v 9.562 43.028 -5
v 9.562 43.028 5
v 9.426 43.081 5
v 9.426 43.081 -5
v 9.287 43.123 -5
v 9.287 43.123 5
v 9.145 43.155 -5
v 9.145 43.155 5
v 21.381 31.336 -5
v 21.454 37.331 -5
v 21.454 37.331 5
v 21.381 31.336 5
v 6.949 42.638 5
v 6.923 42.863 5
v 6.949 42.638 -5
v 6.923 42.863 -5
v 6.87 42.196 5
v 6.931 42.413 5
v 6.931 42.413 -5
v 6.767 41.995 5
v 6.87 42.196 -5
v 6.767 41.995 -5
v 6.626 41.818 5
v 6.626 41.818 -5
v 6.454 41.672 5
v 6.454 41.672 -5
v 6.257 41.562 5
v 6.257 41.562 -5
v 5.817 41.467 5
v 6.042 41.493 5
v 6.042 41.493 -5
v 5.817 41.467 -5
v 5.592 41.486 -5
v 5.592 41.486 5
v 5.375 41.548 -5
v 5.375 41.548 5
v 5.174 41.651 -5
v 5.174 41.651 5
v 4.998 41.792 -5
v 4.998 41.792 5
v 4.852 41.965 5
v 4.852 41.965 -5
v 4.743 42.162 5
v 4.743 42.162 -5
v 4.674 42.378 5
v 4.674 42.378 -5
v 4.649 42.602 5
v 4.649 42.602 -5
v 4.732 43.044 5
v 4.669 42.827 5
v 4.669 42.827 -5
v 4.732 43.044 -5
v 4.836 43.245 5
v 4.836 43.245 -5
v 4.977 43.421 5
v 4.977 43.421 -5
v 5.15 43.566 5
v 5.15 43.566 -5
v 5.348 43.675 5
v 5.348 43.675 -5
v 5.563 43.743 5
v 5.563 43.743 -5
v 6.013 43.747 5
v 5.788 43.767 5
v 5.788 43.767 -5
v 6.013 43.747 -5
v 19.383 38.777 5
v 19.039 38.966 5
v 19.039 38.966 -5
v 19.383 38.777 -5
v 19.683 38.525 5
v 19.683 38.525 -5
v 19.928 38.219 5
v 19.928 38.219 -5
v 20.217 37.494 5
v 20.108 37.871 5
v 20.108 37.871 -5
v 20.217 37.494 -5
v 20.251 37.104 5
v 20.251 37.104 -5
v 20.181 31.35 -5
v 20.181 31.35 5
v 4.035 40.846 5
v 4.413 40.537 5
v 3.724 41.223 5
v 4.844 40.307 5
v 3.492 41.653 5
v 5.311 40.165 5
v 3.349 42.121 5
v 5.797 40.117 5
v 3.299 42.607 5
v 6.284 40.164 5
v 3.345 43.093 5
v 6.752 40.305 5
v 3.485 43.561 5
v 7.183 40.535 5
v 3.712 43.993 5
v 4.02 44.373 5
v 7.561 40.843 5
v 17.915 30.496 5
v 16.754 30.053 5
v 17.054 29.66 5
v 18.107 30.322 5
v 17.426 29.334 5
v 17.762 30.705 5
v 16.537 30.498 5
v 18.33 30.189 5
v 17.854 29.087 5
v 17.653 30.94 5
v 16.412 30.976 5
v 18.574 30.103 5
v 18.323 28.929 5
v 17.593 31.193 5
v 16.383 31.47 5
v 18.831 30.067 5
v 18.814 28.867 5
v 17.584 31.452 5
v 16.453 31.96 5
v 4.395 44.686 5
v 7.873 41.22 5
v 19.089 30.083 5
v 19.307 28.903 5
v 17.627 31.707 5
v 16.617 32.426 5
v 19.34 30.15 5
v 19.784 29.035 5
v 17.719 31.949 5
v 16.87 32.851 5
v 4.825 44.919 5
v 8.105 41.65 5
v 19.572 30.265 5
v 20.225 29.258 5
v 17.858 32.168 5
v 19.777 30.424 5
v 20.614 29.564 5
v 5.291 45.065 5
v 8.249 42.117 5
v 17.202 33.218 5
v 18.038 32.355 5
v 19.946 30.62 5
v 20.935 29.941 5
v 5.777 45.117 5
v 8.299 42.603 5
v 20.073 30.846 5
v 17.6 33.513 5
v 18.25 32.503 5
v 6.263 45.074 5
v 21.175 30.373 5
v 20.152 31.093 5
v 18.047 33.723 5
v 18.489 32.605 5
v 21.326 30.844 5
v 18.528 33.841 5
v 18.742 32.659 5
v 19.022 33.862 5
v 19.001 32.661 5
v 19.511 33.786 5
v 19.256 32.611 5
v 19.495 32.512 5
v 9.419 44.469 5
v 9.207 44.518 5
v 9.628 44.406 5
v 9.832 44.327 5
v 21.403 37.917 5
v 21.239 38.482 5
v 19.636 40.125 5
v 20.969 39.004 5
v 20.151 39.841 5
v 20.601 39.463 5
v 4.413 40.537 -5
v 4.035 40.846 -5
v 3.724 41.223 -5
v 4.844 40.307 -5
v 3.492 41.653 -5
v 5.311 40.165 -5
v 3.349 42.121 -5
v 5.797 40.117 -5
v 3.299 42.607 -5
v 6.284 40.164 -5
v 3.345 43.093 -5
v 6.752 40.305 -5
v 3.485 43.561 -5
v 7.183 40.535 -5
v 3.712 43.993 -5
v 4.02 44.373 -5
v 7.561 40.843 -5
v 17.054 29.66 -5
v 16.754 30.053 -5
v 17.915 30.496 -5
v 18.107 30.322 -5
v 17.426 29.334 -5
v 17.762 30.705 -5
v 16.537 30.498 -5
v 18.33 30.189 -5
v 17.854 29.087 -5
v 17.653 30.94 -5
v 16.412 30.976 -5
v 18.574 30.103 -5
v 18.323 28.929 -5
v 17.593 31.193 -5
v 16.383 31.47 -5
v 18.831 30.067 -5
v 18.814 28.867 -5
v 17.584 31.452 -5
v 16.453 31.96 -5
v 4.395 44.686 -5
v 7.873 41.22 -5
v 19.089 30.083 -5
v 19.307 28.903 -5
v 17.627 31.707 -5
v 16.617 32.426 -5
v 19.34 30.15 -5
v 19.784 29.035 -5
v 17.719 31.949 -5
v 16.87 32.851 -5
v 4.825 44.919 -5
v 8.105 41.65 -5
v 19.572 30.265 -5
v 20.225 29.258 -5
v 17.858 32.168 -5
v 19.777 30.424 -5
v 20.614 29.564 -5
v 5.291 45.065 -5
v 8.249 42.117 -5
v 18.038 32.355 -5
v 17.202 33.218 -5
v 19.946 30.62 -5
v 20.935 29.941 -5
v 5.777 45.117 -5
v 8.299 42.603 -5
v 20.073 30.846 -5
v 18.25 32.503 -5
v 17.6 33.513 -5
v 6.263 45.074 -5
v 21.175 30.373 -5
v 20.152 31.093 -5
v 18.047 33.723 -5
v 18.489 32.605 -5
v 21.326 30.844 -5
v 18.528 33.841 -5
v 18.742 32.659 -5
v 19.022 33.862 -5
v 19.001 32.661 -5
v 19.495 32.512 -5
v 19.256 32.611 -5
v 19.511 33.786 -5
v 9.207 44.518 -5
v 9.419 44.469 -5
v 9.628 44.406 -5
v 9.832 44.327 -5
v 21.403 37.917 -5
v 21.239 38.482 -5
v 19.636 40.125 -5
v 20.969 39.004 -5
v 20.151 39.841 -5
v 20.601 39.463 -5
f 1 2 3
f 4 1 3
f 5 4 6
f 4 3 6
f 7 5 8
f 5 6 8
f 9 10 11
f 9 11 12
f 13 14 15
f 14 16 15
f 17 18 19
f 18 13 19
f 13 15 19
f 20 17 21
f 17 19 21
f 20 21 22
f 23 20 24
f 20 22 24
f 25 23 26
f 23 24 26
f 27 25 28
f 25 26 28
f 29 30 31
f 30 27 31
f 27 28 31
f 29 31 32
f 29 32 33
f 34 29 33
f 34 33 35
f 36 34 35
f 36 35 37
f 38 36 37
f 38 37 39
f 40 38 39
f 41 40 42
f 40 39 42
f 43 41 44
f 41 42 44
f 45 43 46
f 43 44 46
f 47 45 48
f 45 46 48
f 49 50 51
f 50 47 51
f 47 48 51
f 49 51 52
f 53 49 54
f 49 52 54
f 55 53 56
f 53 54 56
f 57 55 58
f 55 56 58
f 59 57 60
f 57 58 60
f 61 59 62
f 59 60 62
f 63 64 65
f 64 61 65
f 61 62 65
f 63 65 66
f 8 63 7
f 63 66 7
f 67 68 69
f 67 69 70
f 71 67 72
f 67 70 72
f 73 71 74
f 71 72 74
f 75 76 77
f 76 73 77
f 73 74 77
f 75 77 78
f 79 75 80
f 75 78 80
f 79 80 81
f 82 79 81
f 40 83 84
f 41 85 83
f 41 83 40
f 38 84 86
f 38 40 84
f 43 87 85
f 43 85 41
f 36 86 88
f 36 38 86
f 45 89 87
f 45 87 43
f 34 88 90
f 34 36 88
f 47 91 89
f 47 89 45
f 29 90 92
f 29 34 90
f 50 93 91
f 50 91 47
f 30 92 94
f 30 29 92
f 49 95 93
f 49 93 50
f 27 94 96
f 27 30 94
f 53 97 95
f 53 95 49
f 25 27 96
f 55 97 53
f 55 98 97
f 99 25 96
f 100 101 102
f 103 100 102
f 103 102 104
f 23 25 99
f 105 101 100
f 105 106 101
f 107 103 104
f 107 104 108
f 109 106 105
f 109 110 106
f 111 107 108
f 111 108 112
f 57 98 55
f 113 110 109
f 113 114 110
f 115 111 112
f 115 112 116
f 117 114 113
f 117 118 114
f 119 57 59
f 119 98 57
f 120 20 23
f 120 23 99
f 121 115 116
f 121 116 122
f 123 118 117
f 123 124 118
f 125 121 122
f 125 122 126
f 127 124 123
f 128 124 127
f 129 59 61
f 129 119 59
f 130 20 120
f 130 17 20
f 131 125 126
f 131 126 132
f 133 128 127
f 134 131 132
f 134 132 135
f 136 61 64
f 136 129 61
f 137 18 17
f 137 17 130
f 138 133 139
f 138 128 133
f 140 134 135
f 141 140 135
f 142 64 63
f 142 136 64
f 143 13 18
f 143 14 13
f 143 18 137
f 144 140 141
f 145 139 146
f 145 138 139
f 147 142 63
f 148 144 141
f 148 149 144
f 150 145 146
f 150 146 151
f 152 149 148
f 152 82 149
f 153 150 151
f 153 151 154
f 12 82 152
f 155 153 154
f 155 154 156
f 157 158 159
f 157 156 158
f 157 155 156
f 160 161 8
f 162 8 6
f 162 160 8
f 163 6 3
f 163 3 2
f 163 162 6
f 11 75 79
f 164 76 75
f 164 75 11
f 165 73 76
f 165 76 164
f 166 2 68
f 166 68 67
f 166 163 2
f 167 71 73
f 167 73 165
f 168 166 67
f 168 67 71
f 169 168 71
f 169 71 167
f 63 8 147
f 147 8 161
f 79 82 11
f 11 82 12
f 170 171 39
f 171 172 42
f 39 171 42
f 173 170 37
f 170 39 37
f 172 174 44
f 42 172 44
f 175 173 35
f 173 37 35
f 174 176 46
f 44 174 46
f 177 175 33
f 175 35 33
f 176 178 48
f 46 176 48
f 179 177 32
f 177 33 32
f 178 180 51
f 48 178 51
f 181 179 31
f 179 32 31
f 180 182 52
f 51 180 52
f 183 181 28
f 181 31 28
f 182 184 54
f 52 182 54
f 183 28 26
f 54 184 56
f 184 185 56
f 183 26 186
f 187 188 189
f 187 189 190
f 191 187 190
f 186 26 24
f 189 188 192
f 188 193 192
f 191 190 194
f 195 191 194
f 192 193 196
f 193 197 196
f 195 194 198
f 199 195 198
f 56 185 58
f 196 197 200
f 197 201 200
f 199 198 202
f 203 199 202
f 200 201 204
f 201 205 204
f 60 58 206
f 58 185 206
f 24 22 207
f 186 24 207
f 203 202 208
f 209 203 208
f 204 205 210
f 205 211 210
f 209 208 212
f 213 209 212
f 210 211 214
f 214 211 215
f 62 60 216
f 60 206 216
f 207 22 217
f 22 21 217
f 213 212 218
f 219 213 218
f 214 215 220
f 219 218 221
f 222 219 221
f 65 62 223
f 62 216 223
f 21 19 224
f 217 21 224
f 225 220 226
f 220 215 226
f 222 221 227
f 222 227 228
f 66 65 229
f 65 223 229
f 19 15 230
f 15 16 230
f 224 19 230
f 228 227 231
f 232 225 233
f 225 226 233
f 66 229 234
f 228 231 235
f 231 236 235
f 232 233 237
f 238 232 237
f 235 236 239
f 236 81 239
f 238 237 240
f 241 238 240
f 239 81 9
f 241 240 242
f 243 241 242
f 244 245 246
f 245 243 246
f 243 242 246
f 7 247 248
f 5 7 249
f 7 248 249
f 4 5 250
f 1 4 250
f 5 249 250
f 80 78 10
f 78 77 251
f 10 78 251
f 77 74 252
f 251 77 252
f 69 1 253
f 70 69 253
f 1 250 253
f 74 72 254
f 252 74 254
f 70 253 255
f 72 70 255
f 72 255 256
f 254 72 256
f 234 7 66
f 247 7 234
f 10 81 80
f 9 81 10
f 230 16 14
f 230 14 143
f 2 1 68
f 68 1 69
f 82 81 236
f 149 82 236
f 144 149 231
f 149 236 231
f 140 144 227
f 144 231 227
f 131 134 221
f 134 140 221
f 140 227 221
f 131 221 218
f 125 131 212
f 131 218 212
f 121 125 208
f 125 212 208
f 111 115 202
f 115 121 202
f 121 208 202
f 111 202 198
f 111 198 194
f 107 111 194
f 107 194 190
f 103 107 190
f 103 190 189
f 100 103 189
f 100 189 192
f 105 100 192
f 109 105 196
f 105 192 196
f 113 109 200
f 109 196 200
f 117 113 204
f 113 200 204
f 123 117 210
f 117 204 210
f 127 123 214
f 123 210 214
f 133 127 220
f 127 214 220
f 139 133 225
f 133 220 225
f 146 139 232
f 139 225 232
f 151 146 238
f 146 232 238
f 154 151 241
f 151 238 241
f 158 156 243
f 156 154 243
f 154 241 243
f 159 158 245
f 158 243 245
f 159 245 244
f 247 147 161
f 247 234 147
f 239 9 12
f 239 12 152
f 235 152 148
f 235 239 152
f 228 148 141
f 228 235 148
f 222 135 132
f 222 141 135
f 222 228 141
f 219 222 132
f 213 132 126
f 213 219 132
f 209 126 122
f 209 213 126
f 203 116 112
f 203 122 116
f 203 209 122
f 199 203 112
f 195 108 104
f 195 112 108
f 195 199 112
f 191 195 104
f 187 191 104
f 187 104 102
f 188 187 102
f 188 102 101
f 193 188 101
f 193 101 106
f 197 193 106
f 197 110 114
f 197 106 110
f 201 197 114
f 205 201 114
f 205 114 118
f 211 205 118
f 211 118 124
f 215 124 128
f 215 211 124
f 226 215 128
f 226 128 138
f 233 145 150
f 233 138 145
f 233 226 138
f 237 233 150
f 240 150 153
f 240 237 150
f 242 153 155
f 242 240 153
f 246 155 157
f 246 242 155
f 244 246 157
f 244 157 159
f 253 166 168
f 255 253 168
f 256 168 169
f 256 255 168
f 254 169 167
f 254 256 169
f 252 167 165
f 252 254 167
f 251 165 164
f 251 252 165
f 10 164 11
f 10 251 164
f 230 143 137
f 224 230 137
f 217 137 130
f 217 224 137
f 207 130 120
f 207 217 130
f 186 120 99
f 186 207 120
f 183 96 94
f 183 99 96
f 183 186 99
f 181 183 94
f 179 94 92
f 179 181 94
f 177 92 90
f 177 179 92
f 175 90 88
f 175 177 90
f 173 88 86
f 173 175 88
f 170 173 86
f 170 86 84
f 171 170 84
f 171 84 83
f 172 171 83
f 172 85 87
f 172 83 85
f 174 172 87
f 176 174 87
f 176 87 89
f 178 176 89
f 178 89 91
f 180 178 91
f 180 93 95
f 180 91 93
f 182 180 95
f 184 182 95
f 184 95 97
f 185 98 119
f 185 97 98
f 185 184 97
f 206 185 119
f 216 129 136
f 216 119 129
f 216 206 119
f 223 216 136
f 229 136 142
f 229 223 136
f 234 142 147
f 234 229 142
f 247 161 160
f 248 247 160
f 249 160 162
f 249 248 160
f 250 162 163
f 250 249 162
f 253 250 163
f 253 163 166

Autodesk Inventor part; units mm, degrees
ref_plane "YZ Plane" through (0, 0, 0) normal (1, 0, 0) x (0, 1, 0)
ref_plane "XZ Plane" through (0, 0, 0) normal (0, 1, 0) x (-1, 0, 0)
ref_plane "XY Plane" through (0, 0, 0) normal (0, 0, 1) x (1, 0, 0)
sketch "Sketch1" plane through (0, 0, 0) normal (0, 0, 1) x (1, 0, 0)
  arc A0 (6.0128, 43.747) -> (6.9228, 42.8627) centre (5.7994, 42.6169) ccw
  arc A1 (6.2634, 45.0735) -> (8.2994, 42.6027) centre (5.7994, 42.6169) ccw
  arc A2 (19.5106, 33.7857) -> (21.381, 31.3359) centre (18.8812, 31.3663) ccw
  line L0 (6.2634, 45.0735) -> (9.5295, 44.4566)
  line L1 (9.5295, 44.4566) -> (21.4782, 39.3353)
  line L2 (21.4782, 39.3353) -> (21.381, 31.3359)
  line L3 (6.0128, 43.747) -> (9.3605, 43.1146)
  line L4 (9.3605, 43.1146) -> (20.2673, 38.4399)
  line L5 (20.2673, 38.4399) -> (20.1811, 31.3505)
  line L6 (6.9228, 42.8627) -> (8.2994, 42.6027)
  line L7 (19.5106, 33.7857) -> (19.4952, 32.5121)
  arc A3 (19.4952, 32.5121) -> (20.1811, 31.3505) centre (18.8812, 31.3663) ccw
  line L8 (5.7994, 42.6169) -> (18.8812, 31.3663) construction
  arc A4 (6.9392, 42.2416) -> (4.6204, 42.3936) centre (5.7994, 42.6169) ccw
  point P0 (0, 0)
  dimension "d0" = 5
  dimension "d1" = 5
  dimension "d2" = 1.3
  dimension "d5" = 1.35
  dimension "d8" = 8
  dimension "d9" = 0.7
  dimension "d10" = 0.7
  dimension "d12" = 1.2
  dimension "d18" = 2.3
  dimension "d19" = 30
  dimension "d20" = 13
  dimension "d21" = 50
extrude "Extrusion1" add sketch "Sketch1" along normal mid plane 10 contours A0 L6 A1 L0 L1 L2 A2 L7 A3 L5 L4 L3
fillet "Fillet1" radius 2 2 edges at (20.2673, 38.4399, 0) (9.3605, 43.1146, 0)
fillet "Fillet1" radius 3 2 edges at (9.5295, 44.4566, 0) (21.4782, 39.3353, 0)
properties part number "Linkage for half overlay hinge" material "Steel"
